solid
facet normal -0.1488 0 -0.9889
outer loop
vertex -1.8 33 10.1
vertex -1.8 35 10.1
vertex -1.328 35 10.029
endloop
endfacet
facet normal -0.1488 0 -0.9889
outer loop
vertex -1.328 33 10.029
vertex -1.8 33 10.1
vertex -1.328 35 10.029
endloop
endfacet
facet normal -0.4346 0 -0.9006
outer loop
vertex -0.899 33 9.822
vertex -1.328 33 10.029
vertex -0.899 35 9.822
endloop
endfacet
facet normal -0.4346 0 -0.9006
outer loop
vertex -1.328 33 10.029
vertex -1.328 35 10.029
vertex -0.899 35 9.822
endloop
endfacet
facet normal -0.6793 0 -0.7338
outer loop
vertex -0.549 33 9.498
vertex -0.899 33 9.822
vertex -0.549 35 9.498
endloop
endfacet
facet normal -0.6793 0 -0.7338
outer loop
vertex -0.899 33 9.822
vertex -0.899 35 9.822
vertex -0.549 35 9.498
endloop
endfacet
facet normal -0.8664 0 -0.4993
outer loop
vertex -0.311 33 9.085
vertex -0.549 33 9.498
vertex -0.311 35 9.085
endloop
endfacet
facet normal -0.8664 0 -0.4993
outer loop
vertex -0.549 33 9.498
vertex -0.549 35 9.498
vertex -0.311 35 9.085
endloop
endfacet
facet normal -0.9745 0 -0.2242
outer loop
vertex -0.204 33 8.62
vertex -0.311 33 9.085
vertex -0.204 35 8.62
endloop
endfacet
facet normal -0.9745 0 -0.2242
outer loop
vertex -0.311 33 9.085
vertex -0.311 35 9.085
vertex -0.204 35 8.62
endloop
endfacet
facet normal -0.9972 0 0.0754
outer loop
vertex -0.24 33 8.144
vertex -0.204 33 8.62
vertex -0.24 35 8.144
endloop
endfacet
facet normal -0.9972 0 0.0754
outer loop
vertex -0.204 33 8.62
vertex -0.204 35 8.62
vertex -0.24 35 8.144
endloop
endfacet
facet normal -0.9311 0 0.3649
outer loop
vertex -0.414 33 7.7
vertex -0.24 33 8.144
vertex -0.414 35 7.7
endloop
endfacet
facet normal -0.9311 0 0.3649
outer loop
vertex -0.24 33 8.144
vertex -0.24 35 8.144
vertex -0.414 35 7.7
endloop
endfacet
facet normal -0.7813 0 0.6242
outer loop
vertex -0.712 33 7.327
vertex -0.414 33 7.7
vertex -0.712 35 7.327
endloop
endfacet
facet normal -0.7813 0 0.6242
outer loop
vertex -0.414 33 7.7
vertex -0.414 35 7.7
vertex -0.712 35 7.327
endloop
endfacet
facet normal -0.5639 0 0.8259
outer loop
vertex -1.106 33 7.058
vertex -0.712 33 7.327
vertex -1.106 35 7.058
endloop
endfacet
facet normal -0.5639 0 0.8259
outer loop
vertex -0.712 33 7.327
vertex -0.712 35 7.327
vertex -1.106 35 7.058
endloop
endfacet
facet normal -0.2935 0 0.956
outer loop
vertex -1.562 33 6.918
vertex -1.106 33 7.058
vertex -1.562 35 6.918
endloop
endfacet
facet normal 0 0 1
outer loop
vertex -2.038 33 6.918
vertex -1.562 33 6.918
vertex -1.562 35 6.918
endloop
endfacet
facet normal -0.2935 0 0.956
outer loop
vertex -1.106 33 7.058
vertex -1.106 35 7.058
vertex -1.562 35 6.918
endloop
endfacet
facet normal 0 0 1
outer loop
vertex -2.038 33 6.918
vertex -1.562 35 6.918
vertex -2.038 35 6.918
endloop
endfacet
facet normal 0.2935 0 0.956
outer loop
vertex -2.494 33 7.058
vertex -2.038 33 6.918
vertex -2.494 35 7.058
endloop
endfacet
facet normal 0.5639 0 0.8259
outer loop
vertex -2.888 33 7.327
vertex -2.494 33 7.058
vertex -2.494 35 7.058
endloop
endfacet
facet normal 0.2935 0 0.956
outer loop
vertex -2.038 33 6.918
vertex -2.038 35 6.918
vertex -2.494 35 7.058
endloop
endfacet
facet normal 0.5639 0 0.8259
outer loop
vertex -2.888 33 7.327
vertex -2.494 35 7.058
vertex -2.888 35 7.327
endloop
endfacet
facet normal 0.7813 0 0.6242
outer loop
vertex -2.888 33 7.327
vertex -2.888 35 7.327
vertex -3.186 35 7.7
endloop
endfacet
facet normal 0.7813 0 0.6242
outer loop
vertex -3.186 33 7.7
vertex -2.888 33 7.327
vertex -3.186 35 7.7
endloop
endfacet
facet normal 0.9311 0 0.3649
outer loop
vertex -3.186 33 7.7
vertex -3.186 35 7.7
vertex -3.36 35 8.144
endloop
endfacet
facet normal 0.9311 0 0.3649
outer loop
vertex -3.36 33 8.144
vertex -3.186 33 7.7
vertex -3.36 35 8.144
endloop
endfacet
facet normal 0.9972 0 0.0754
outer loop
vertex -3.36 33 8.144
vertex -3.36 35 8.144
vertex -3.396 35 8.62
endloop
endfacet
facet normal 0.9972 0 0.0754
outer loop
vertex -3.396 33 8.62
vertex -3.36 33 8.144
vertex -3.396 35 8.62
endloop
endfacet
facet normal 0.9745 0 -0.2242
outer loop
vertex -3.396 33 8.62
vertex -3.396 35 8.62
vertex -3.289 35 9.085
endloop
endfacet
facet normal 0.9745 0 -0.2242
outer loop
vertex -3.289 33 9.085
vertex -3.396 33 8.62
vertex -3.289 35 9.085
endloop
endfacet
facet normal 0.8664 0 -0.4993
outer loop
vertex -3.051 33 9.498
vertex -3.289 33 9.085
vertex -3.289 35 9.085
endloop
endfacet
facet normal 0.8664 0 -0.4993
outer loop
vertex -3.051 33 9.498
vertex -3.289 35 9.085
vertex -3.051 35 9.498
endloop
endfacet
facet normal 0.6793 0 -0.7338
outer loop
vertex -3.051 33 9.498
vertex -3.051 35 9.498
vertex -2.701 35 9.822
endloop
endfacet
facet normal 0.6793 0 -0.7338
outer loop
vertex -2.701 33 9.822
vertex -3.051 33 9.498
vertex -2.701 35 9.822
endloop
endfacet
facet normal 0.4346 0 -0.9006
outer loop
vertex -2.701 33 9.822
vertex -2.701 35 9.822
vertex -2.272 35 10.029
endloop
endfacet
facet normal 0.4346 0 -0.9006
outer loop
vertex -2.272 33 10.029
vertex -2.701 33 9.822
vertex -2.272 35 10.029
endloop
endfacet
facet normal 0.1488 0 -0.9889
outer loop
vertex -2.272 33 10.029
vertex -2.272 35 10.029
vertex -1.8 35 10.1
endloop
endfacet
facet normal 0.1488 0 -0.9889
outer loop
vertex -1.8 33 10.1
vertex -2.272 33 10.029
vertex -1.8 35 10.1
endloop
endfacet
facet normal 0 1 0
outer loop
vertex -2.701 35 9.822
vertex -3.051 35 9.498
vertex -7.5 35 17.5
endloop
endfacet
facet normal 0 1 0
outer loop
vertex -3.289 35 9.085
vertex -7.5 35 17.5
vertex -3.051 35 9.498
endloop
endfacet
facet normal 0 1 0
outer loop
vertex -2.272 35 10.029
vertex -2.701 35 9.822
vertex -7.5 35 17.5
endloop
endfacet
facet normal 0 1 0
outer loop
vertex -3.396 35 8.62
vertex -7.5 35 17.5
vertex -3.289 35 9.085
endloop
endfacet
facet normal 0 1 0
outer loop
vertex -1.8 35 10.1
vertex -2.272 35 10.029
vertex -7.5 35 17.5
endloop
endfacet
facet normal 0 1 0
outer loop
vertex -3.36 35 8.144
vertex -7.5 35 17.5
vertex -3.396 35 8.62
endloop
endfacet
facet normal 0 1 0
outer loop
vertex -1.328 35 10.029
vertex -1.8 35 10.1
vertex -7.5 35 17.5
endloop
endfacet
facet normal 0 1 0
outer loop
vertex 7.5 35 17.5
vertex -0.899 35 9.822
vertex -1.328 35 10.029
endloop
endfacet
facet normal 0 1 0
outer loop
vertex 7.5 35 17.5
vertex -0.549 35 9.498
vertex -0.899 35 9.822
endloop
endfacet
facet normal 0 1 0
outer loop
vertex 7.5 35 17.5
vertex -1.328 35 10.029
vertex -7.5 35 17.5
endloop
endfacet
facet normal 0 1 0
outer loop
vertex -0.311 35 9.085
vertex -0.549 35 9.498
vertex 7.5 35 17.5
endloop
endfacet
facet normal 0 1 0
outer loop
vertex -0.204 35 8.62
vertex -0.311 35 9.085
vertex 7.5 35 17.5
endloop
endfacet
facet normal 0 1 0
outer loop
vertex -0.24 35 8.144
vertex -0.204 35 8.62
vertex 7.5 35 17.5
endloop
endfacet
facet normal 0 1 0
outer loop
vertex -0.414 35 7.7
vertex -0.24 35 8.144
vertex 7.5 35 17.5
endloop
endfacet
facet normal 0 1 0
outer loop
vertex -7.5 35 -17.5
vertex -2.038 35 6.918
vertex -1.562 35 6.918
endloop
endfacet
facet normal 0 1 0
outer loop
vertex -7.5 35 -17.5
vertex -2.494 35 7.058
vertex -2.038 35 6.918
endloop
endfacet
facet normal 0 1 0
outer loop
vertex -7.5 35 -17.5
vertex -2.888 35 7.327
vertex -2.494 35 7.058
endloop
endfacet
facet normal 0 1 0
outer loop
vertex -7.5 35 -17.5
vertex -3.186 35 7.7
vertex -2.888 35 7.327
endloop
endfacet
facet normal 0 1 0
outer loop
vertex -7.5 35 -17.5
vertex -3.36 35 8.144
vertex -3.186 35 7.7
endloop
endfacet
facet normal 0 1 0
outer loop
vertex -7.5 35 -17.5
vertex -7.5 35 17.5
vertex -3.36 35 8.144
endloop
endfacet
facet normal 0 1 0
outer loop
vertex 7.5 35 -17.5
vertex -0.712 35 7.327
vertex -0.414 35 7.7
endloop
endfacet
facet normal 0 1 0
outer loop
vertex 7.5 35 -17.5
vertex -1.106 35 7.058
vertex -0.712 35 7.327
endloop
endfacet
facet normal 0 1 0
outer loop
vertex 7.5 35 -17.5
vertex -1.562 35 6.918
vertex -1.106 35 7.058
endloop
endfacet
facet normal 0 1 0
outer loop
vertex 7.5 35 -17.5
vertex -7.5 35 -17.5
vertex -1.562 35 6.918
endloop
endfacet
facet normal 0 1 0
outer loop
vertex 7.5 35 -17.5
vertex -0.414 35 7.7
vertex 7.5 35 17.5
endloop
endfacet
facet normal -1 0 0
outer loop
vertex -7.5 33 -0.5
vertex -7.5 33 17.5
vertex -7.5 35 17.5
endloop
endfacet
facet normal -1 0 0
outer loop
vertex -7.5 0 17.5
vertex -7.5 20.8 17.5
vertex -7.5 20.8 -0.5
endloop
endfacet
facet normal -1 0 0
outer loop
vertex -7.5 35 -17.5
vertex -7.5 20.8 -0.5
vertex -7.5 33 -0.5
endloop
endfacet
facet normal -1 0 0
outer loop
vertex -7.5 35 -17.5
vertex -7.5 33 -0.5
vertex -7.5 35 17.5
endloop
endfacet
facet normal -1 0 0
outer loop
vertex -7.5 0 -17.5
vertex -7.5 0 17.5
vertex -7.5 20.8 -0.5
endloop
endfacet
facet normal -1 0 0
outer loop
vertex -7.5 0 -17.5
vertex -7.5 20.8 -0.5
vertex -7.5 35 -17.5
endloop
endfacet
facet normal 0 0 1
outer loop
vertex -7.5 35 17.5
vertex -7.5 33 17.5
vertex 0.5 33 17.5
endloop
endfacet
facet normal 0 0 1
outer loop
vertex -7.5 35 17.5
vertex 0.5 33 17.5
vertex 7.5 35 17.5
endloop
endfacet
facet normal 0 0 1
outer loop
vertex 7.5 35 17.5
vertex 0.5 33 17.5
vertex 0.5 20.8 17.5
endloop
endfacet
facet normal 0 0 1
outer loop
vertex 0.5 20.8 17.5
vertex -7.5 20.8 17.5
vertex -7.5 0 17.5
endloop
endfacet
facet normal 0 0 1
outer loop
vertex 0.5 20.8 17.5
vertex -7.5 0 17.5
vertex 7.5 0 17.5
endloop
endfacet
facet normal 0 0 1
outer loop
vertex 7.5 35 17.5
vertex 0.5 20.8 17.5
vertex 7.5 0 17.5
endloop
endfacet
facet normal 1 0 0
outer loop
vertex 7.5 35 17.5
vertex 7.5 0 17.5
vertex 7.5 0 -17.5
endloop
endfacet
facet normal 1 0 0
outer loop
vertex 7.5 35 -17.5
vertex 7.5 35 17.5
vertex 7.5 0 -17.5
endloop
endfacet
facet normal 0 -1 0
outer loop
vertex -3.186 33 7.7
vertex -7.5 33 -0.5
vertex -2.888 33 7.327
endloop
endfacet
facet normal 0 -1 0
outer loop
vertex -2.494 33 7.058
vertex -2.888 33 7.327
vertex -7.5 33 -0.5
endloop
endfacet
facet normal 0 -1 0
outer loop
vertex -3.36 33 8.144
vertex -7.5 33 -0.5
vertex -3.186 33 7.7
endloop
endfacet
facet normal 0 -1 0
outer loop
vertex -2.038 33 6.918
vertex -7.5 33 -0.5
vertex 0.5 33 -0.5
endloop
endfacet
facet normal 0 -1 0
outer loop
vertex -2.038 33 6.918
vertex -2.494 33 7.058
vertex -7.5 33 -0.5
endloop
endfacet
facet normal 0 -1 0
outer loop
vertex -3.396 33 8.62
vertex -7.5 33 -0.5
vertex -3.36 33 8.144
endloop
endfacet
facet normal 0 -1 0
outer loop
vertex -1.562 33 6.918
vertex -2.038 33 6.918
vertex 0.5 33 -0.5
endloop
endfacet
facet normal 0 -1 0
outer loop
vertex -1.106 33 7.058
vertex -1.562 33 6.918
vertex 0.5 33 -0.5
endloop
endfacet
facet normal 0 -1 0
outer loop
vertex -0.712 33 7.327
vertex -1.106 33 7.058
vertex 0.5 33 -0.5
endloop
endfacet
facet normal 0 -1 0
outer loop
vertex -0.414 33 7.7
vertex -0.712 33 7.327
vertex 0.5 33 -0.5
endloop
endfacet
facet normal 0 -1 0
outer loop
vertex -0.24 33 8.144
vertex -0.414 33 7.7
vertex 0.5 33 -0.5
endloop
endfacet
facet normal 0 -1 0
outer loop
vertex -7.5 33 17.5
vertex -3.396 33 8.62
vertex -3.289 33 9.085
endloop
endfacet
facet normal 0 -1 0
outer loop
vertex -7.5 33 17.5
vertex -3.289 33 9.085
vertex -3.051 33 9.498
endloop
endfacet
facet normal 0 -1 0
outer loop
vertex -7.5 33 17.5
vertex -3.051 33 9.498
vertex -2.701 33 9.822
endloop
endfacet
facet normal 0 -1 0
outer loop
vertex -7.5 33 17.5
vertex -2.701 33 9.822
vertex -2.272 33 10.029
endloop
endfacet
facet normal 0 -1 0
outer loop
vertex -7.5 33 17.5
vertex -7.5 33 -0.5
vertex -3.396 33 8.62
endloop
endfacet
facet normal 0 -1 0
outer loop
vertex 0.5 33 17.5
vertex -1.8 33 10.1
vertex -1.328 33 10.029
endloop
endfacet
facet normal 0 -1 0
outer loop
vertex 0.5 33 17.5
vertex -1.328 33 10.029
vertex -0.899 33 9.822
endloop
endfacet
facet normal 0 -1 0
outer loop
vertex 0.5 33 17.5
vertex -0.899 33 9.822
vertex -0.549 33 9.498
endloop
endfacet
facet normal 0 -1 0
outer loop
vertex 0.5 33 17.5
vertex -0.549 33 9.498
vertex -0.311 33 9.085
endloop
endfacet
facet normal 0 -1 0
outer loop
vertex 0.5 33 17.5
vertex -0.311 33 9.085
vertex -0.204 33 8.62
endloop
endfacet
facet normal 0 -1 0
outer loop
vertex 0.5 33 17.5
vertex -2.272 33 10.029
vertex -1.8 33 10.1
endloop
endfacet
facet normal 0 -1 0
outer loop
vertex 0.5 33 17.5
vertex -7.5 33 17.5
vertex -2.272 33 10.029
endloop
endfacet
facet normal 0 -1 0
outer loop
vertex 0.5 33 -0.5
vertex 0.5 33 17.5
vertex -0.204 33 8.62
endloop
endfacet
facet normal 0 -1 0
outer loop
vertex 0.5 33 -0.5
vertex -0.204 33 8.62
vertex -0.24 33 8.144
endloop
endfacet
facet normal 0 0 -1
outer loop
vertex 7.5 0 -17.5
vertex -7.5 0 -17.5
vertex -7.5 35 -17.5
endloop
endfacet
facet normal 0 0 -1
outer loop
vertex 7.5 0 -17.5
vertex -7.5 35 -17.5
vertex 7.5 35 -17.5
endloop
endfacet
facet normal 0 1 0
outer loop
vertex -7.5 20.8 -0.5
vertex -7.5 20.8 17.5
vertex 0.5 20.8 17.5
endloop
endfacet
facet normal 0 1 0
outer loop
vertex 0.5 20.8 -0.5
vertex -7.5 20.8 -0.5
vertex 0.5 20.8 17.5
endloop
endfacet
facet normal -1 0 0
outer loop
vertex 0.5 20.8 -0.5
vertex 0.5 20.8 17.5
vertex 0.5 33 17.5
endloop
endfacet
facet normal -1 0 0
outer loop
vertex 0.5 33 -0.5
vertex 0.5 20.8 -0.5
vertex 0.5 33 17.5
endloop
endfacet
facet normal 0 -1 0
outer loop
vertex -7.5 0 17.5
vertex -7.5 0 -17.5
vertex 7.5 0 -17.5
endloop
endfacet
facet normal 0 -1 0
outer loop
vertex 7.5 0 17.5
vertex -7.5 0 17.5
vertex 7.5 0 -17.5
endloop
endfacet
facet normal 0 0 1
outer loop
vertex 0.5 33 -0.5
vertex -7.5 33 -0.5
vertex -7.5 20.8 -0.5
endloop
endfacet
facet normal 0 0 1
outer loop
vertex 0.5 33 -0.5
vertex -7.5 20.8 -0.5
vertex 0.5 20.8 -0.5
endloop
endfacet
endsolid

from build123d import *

# Parameters (mm, degrees)
SKETCH1_W           = 15
SKETCH1_H           = 35
BOSS_EXTRUDE1_DEPTH = 35
SKETCH3_W           = 8
SKETCH3_H           = 12.2
CUT_EXTRUDE2_DEPTH  = 18
SKETCH4_R           = 1.6
CUT_EXTRUDE3_DEPTH  = 8


with BuildPart() as part:
    # Sketch1 → Boss-Extrude1 (new body)
    with BuildSketch(Plane(origin=(0, 0, 0), x_dir=(1, 0, 0), z_dir=(0, 1, 0))):
        Rectangle(SKETCH1_W, SKETCH1_H)
    extrude(amount=BOSS_EXTRUDE1_DEPTH)

    # Sketch3 → Cut-Extrude2 (cut)
    with BuildSketch(Plane.XY.offset(17.5)):
        with Locations((-3.5, 26.9)):
            Rectangle(SKETCH3_W, SKETCH3_H)
    extrude(amount=-CUT_EXTRUDE2_DEPTH, mode=Mode.SUBTRACT)

    # Sketch4 → Cut-Extrude3 (cut)
    with BuildSketch(Plane(origin=(0, 35, 0), x_dir=(1, 0, 0), z_dir=(0, 1, 0))):
        with Locations(Location((-1.8, -8.5, 0), (0, 0, 270))):  # turned: the seam where the file's is
            Circle(SKETCH4_R)
    extrude(amount=-CUT_EXTRUDE3_DEPTH, mode=Mode.SUBTRACT)


solid = part.part
